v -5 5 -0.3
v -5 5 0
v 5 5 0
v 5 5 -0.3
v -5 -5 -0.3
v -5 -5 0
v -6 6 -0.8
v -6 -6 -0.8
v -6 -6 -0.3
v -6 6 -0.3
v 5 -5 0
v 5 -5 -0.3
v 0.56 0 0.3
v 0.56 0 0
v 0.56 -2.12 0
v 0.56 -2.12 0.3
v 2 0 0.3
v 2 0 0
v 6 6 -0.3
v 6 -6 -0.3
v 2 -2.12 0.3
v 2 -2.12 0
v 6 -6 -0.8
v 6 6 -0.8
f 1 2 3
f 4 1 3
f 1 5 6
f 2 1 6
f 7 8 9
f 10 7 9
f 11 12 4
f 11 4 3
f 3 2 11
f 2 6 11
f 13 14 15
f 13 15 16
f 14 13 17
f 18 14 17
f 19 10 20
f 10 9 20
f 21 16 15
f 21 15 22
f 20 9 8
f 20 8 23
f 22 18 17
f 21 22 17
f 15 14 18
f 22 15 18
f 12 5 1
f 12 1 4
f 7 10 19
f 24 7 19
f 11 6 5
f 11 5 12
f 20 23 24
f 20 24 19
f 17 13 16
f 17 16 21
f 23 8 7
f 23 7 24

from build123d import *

# Parameters (mm, degrees)
F0_W     = 10
F0_H     = 0.3
F1_DEPTH = 5
F2_W     = 1.44
F2_H     = 0.3
F3_DEPTH = 2.12
F4_W     = 12
F4_H     = 0.5
F5_DEPTH = 6


with BuildPart() as f1:
    # F0 (on Front) → F1 (new body, symmetric)
    with BuildSketch(Plane.XZ):
        with Locations((0, -0.15)):
            Rectangle(F0_W, F0_H)
    extrude(amount=F1_DEPTH, both=True)


with BuildPart() as f3:
    # F2 (on Front) → F3 (new body)
    with BuildSketch(Plane.XZ):
        with Locations((1.28, 0.15)):
            Rectangle(F2_W, F2_H)
    extrude(amount=F3_DEPTH)


with BuildPart() as f5:
    # F4 (on Front) → F5 (new body, symmetric)
    with BuildSketch(Plane.XZ):
        with Locations((0, -0.55)):
            Rectangle(F4_W, F4_H)
    extrude(amount=F5_DEPTH, both=True)


solid = Compound([f1.part, f3.part, f5.part])
